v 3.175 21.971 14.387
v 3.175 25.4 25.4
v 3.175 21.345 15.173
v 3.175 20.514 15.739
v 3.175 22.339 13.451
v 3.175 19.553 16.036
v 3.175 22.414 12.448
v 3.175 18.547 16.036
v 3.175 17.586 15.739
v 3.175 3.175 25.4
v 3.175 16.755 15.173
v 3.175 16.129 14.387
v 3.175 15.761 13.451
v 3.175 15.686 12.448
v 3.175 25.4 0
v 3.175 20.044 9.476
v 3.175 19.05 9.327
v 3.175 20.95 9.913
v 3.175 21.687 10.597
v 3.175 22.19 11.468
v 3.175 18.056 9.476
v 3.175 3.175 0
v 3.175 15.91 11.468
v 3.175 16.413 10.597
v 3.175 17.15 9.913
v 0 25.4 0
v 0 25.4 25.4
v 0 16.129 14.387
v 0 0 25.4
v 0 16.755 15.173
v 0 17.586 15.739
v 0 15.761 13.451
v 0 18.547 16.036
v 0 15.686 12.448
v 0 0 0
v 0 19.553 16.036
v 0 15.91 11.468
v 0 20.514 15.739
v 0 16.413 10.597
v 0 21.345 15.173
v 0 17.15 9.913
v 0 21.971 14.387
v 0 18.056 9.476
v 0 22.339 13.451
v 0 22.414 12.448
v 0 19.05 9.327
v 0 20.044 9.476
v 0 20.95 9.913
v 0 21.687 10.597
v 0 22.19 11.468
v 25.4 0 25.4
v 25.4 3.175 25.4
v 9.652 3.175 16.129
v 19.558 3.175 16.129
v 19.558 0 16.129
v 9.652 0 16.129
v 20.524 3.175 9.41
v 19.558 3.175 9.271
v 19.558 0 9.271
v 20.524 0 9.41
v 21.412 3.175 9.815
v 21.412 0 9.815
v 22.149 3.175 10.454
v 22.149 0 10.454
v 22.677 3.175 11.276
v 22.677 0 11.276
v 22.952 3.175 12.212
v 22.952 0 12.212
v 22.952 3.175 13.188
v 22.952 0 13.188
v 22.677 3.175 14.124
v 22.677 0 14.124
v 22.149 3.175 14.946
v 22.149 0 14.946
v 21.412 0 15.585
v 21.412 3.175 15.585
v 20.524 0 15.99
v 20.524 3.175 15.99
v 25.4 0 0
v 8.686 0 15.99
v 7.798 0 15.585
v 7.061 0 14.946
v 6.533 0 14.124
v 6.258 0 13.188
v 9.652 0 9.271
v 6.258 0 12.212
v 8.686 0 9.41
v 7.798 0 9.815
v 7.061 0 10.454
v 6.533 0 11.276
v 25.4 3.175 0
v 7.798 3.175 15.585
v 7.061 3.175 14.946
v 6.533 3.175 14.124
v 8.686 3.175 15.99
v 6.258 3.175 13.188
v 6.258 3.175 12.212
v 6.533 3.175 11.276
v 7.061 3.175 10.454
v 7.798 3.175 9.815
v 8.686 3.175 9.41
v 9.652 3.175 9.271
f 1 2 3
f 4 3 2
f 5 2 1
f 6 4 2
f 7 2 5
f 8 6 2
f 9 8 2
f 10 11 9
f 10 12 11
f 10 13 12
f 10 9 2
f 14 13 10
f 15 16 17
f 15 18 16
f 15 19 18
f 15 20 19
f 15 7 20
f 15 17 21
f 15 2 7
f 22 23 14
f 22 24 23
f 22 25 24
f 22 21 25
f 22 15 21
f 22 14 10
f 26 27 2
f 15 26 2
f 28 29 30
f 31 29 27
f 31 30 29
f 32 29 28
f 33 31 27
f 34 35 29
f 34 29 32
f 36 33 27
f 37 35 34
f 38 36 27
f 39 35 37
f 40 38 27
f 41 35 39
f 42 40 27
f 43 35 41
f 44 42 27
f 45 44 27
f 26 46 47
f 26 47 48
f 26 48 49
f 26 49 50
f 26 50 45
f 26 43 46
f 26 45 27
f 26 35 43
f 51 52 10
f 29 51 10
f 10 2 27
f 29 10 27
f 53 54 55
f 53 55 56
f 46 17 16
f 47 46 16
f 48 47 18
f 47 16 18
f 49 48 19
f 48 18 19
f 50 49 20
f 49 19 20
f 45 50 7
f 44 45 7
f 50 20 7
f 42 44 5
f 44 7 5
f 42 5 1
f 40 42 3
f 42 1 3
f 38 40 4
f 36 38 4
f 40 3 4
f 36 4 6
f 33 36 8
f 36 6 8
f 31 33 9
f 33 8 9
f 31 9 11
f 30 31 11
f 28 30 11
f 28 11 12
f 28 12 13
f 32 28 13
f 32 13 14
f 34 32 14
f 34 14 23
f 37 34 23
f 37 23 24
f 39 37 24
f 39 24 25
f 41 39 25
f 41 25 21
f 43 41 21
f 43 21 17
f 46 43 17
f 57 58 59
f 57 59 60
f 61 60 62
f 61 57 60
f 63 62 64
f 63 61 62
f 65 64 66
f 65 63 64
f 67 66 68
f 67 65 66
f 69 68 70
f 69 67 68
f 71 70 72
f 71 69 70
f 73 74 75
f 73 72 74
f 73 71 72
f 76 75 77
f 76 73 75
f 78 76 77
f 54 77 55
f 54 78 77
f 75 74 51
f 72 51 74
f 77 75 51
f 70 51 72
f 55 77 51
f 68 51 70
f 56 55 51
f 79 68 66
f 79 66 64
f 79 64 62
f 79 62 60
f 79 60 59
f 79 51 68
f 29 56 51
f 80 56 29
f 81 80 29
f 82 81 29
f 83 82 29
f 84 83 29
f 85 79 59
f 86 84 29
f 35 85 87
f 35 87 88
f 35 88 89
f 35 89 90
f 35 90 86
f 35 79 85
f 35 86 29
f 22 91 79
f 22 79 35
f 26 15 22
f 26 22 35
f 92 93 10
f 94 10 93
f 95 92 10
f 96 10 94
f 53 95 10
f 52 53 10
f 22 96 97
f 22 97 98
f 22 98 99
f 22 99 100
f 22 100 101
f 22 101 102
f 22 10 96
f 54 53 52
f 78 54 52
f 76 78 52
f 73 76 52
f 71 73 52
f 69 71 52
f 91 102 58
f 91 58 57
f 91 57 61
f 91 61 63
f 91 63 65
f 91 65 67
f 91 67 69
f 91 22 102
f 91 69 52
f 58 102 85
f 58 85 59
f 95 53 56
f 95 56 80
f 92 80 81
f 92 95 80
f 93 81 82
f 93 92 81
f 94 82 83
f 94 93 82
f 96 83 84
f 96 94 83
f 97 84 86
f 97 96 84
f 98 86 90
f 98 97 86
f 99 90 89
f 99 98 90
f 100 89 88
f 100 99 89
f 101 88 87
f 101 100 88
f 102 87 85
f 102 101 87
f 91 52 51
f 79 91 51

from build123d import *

# Parameters (mm, degrees)
BOSS_EXTRUDE1_DEPTH = 25.4
CUT_EXTRUDE1_DEPTH  = 25.4
SKETCH3_R           = 3.3734375
CUT_EXTRUDE2_DEPTH  = 25.4


with BuildPart() as part:
    # Sketch1 → Boss-Extrude1 (new body)
    with BuildSketch(Plane.XY):
        Polygon((0, 0), (0, 25.4), (3.175, 25.4), (3.175, 3.175), (25.4, 3.175), (25.4, 0), align=None)
    extrude(amount=BOSS_EXTRUDE1_DEPTH)

    # Sketch2 → Cut-Extrude1 (cut)
    with BuildSketch(Plane(origin=(0, 3.175, 0), x_dir=(1, 0, 0), z_dir=(0, 1, 0))):
        with BuildLine():
            Line((9.652, -9.271), (19.558, -9.271))
            ThreePointArc((19.558, -9.271), (22.987, -12.7), (19.558, -16.129))
            Line((19.558, -16.129), (9.652, -16.129))
            ThreePointArc((9.652, -16.129), (6.223, -12.7), (9.652, -9.271))
        make_face()
    extrude(amount=-CUT_EXTRUDE1_DEPTH, mode=Mode.SUBTRACT)

    # Sketch3 → Cut-Extrude2 (cut)
    with BuildSketch(Plane(origin=(3.175, 0, 0), x_dir=(0, 0, -1), z_dir=(1, 0, 0))):
        with Locations((-12.7, 19.05)):
            Circle(SKETCH3_R)
    extrude(amount=-CUT_EXTRUDE2_DEPTH, mode=Mode.SUBTRACT)


solid = part.part
